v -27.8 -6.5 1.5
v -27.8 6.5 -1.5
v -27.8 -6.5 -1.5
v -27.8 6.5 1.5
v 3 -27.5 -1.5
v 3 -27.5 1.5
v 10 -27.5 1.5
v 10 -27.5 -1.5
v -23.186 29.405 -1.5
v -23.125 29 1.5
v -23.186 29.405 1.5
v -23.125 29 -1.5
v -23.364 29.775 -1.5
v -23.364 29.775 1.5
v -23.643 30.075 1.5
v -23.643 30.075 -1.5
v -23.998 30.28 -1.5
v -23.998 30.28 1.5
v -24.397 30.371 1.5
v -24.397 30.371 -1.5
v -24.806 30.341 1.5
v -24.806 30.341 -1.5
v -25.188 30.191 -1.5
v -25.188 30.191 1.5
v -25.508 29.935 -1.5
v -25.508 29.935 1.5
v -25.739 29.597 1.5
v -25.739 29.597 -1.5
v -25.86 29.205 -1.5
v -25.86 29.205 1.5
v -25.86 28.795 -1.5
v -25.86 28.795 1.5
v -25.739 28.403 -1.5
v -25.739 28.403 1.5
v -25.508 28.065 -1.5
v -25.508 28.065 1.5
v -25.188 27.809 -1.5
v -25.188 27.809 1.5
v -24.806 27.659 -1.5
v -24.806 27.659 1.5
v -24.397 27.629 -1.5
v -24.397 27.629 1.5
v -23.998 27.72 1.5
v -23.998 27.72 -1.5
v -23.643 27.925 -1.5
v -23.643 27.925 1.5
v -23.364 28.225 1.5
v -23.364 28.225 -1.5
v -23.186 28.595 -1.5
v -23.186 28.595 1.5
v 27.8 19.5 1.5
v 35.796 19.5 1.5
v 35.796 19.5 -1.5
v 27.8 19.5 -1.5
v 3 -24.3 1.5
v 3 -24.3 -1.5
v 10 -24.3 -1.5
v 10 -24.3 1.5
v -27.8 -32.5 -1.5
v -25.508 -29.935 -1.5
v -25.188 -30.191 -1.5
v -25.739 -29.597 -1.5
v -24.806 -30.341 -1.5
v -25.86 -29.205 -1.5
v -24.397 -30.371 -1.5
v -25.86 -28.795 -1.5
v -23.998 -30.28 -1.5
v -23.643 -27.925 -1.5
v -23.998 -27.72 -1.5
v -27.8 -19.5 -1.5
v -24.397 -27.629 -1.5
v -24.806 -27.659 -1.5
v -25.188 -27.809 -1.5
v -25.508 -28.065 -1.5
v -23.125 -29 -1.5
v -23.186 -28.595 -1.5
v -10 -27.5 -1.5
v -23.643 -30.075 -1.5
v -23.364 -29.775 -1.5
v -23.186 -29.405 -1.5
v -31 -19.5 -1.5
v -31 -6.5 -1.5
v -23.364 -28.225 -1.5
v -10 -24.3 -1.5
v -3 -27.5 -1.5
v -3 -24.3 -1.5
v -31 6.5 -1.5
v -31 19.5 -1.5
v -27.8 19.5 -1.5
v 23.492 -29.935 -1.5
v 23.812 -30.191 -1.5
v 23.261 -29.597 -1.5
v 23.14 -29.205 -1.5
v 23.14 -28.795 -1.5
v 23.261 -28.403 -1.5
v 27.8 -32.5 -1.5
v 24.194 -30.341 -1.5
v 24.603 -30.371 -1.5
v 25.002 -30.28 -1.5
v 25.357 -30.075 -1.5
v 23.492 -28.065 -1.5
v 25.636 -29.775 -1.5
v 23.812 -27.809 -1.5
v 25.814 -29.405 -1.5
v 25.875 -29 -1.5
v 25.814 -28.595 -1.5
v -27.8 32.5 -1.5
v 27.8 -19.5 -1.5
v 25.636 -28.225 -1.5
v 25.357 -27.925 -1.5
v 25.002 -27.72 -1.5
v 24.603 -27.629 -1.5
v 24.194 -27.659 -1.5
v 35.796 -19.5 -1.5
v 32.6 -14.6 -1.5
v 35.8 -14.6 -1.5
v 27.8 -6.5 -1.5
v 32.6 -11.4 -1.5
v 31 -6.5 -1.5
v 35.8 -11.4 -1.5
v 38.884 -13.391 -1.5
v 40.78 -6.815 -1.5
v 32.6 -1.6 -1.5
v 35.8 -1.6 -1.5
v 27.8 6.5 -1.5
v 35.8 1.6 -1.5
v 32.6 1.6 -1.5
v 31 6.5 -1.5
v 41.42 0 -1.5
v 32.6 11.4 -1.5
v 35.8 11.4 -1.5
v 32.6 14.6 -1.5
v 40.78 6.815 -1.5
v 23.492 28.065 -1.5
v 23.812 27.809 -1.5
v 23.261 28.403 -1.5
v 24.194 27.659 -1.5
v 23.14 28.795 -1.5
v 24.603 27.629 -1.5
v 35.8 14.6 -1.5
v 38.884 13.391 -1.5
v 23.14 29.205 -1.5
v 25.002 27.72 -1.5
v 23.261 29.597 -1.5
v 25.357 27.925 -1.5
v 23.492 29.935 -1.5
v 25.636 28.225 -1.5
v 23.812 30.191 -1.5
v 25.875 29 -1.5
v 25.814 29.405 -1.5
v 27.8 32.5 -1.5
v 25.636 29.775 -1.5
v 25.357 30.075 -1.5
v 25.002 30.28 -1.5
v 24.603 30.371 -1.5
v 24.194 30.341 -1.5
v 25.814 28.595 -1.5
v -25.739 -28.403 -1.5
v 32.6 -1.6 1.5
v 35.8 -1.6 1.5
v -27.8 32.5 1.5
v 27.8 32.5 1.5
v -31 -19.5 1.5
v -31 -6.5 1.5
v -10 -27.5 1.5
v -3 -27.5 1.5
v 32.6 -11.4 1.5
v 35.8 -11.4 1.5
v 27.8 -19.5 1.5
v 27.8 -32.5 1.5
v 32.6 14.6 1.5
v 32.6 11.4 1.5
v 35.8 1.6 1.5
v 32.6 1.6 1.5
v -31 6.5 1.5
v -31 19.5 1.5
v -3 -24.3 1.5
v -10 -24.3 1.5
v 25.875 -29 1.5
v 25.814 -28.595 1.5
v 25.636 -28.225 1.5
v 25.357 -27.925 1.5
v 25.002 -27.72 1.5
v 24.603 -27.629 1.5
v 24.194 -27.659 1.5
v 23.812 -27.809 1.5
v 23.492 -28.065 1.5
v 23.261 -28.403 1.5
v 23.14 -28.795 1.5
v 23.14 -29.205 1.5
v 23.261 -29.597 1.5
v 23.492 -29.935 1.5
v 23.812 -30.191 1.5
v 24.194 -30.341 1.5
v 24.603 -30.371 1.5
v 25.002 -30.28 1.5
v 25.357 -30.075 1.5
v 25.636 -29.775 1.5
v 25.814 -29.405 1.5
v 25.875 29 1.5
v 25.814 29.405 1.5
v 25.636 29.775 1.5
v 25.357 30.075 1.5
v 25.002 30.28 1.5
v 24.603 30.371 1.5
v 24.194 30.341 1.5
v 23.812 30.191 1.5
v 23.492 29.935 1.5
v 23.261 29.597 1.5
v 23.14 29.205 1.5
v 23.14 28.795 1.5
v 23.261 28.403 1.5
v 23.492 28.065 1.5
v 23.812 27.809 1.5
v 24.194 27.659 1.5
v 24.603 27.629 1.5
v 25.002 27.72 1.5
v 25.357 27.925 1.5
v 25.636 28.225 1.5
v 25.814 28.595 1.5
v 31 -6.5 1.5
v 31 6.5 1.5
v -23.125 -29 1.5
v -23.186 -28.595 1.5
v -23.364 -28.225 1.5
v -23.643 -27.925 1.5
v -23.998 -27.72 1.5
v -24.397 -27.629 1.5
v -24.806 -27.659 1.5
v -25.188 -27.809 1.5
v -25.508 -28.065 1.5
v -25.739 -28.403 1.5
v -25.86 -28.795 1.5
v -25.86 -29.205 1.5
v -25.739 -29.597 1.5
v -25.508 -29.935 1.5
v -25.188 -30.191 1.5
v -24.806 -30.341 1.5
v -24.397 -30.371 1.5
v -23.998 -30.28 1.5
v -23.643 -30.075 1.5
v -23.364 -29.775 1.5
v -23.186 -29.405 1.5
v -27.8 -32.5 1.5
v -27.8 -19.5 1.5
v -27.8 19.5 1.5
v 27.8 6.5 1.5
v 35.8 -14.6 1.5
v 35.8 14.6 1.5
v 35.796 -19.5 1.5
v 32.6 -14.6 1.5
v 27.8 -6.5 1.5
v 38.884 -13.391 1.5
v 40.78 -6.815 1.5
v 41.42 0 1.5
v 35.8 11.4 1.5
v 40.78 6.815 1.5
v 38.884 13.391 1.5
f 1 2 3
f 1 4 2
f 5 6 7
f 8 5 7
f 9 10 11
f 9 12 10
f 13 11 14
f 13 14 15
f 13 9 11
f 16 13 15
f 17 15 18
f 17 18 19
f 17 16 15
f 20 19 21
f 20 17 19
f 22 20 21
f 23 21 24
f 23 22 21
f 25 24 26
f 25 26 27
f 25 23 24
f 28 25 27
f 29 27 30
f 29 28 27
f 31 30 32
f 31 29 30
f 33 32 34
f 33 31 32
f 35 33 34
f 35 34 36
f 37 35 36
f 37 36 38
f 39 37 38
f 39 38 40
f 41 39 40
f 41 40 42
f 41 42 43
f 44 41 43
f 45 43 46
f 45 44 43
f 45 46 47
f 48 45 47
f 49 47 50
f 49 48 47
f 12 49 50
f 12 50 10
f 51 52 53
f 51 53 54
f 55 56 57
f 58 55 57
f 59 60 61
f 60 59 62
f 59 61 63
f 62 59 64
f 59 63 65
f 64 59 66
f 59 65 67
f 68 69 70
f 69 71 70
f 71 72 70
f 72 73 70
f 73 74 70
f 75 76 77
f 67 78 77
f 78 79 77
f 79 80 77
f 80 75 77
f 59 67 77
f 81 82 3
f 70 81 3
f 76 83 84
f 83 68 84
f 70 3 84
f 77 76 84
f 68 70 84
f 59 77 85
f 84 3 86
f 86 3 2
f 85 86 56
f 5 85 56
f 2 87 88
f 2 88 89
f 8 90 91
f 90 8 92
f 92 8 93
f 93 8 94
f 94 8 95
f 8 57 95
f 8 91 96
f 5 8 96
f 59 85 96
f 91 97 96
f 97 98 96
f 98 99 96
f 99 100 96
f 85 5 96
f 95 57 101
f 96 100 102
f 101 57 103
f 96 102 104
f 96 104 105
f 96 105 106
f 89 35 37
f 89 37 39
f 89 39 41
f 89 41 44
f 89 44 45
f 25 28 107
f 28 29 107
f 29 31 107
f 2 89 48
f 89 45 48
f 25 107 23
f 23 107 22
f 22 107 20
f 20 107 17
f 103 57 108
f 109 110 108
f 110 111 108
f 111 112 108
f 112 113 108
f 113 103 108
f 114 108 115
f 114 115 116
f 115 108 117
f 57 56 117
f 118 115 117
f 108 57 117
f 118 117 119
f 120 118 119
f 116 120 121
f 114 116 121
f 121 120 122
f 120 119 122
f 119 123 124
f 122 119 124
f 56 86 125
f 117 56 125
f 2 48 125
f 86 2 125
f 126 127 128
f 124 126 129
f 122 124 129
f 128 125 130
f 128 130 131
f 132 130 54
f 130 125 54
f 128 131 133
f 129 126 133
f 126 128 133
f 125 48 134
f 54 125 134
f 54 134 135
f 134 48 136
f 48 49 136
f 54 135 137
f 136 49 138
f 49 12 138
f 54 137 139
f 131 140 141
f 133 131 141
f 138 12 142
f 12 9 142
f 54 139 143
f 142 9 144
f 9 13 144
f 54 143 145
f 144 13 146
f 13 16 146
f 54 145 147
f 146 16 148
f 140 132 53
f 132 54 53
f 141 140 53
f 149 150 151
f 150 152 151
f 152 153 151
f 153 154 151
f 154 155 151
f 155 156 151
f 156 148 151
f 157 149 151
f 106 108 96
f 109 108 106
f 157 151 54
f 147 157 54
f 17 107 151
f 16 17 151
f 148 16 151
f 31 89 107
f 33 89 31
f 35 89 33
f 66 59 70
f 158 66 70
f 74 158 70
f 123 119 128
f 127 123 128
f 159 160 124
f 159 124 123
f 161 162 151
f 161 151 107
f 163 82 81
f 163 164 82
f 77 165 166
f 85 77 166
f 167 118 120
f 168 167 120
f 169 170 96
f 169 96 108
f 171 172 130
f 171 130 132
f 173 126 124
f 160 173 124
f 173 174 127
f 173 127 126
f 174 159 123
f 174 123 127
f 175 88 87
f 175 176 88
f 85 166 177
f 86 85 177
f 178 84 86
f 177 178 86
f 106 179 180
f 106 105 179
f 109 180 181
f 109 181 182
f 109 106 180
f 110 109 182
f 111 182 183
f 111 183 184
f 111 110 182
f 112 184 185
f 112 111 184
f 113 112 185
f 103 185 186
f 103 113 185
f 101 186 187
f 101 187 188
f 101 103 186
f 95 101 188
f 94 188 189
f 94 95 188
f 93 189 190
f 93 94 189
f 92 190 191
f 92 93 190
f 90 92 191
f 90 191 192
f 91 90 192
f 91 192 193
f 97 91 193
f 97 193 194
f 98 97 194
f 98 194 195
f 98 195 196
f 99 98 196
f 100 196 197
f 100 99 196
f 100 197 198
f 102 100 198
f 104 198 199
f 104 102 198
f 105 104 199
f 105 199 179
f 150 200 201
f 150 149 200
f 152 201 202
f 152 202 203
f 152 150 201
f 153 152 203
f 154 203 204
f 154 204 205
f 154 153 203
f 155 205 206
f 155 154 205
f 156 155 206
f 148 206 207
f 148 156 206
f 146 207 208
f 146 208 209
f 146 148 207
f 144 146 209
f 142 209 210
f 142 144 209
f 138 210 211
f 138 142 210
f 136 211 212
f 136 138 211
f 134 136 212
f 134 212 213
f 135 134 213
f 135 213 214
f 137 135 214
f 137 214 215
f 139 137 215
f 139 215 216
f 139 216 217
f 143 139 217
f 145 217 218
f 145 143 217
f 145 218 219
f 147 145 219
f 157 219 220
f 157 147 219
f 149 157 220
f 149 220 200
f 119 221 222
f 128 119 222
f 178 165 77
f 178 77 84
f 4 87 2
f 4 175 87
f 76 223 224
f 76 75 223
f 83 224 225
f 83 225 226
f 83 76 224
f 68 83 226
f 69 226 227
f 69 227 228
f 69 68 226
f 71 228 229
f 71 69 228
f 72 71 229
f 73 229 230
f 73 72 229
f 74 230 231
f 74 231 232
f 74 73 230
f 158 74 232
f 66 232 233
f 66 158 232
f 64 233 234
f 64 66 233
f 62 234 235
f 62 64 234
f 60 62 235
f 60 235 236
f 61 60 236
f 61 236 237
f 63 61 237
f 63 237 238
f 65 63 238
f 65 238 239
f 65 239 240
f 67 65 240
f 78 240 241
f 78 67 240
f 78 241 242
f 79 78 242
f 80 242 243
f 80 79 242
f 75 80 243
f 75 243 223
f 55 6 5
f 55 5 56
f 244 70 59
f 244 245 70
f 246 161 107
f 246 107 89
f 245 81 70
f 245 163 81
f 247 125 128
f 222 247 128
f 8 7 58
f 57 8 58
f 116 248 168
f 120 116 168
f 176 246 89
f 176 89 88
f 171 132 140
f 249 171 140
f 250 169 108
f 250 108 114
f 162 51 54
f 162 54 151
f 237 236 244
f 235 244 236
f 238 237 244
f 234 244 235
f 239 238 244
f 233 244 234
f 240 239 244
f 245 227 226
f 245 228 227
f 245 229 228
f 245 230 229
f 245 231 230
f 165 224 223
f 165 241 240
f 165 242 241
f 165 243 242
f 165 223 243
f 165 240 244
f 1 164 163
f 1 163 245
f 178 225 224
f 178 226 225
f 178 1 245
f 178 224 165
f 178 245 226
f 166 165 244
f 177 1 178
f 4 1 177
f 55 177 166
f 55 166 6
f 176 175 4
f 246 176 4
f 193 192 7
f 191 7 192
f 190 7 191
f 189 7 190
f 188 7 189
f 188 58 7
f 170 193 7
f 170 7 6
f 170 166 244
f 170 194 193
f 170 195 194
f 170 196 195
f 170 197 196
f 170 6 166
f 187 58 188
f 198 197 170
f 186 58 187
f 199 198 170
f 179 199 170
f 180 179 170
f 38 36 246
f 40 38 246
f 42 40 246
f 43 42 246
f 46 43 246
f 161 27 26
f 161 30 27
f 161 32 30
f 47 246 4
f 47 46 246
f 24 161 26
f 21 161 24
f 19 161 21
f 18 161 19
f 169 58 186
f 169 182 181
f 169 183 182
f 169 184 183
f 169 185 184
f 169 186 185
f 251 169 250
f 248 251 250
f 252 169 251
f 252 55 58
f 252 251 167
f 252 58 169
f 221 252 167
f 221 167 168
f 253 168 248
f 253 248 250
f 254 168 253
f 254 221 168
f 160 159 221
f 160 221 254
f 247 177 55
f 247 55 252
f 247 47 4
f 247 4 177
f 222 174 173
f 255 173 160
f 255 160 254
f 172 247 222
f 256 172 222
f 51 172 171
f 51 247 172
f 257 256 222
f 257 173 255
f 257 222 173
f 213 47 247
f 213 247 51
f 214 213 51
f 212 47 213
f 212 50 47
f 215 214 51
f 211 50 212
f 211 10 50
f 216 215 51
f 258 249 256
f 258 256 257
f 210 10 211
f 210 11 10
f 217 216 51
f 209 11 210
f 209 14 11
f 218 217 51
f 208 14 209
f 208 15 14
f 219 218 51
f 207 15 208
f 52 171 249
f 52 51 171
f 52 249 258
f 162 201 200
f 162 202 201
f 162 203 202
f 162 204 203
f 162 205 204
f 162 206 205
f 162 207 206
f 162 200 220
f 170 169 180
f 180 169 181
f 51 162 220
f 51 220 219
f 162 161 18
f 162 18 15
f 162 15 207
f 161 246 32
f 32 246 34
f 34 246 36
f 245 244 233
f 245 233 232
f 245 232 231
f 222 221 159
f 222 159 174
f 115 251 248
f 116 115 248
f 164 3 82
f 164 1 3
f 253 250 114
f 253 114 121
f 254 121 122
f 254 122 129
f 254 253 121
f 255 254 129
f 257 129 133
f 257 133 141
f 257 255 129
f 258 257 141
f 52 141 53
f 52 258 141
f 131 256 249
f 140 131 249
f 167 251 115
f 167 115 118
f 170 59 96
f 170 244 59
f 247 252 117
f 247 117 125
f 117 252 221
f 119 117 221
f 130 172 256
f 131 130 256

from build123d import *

# Parameters (mm, degrees)
F0_R     = 1.375
F0_W     = 7
F0_H     = 3.2
F0_W_2   = 3.2
F0_H_2   = 13
F1_DEPTH = 1.5


with BuildPart() as f1:
    # F0 (on Top) → F1 (new body, symmetric)
    with BuildSketch(Plane.XY):
        with BuildLine():
            Line((-27.8, -32.5), (27.8, -32.5))
            Line((27.8, -32.5), (27.8, -19.5))
            Line((27.8, -19.5), (31, -19.5))
            Line((31, -19.5), (35.796361, -19.5))
            ThreePointArc((35.796361, -19.5), (41.42, 0), (35.796361, 19.5))
            Line((35.796361, 19.5), (31, 19.5))
            Line((31, 19.5), (27.8, 19.5))
            Line((27.8, 19.5), (27.8, 32.5))
            Line((27.8, 32.5), (-27.8, 32.5))
            Line((-27.8, 32.5), (-27.8, 19.5))
            Line((-27.8, 19.5), (-31, 19.5))
            Line((-31, 19.5), (-31, 6.5))
            Line((-31, 6.5), (-27.8, 6.5))
            Line((-27.8, 6.5), (-27.8, -6.5))
            Line((-27.8, -6.5), (-31, -6.5))
            Line((-31, -6.5), (-31, -19.5))
            Line((-31, -19.5), (-27.8, -19.5))
            Line((-27.8, -19.5), (-27.8, -32.5))
        make_face()
        with Locations((-24.5, -29)):
            Circle(F0_R, mode=Mode.SUBTRACT)
        with Locations((-6.5, -25.9)):
            Rectangle(F0_W, F0_H, mode=Mode.SUBTRACT)
        with Locations((6.5, -25.9)):
            Rectangle(F0_W, F0_H, mode=Mode.SUBTRACT)
        with Locations((24.5, -29)):
            Circle(F0_R, mode=Mode.SUBTRACT)
        with Locations((34.2, -13)):
            Rectangle(F0_W_2, F0_H, mode=Mode.SUBTRACT)
        with Locations((-24.5, 29)):
            Circle(F0_R, mode=Mode.SUBTRACT)
        with Locations((29.4, 0)):
            Rectangle(F0_W_2, F0_H_2, mode=Mode.SUBTRACT)
        Polygon((32.6, 1.6), (34.2, 1.6), (35.8, 1.6), (35.8, -1.6), (32.6, -1.6), align=None, mode=Mode.SUBTRACT)
        with Locations((34.2, 13)):
            Rectangle(F0_W_2, F0_H, mode=Mode.SUBTRACT)
        with Locations((24.5, 29)):
            Circle(F0_R, mode=Mode.SUBTRACT)
    extrude(amount=F1_DEPTH, both=True)


solid = f1.part
